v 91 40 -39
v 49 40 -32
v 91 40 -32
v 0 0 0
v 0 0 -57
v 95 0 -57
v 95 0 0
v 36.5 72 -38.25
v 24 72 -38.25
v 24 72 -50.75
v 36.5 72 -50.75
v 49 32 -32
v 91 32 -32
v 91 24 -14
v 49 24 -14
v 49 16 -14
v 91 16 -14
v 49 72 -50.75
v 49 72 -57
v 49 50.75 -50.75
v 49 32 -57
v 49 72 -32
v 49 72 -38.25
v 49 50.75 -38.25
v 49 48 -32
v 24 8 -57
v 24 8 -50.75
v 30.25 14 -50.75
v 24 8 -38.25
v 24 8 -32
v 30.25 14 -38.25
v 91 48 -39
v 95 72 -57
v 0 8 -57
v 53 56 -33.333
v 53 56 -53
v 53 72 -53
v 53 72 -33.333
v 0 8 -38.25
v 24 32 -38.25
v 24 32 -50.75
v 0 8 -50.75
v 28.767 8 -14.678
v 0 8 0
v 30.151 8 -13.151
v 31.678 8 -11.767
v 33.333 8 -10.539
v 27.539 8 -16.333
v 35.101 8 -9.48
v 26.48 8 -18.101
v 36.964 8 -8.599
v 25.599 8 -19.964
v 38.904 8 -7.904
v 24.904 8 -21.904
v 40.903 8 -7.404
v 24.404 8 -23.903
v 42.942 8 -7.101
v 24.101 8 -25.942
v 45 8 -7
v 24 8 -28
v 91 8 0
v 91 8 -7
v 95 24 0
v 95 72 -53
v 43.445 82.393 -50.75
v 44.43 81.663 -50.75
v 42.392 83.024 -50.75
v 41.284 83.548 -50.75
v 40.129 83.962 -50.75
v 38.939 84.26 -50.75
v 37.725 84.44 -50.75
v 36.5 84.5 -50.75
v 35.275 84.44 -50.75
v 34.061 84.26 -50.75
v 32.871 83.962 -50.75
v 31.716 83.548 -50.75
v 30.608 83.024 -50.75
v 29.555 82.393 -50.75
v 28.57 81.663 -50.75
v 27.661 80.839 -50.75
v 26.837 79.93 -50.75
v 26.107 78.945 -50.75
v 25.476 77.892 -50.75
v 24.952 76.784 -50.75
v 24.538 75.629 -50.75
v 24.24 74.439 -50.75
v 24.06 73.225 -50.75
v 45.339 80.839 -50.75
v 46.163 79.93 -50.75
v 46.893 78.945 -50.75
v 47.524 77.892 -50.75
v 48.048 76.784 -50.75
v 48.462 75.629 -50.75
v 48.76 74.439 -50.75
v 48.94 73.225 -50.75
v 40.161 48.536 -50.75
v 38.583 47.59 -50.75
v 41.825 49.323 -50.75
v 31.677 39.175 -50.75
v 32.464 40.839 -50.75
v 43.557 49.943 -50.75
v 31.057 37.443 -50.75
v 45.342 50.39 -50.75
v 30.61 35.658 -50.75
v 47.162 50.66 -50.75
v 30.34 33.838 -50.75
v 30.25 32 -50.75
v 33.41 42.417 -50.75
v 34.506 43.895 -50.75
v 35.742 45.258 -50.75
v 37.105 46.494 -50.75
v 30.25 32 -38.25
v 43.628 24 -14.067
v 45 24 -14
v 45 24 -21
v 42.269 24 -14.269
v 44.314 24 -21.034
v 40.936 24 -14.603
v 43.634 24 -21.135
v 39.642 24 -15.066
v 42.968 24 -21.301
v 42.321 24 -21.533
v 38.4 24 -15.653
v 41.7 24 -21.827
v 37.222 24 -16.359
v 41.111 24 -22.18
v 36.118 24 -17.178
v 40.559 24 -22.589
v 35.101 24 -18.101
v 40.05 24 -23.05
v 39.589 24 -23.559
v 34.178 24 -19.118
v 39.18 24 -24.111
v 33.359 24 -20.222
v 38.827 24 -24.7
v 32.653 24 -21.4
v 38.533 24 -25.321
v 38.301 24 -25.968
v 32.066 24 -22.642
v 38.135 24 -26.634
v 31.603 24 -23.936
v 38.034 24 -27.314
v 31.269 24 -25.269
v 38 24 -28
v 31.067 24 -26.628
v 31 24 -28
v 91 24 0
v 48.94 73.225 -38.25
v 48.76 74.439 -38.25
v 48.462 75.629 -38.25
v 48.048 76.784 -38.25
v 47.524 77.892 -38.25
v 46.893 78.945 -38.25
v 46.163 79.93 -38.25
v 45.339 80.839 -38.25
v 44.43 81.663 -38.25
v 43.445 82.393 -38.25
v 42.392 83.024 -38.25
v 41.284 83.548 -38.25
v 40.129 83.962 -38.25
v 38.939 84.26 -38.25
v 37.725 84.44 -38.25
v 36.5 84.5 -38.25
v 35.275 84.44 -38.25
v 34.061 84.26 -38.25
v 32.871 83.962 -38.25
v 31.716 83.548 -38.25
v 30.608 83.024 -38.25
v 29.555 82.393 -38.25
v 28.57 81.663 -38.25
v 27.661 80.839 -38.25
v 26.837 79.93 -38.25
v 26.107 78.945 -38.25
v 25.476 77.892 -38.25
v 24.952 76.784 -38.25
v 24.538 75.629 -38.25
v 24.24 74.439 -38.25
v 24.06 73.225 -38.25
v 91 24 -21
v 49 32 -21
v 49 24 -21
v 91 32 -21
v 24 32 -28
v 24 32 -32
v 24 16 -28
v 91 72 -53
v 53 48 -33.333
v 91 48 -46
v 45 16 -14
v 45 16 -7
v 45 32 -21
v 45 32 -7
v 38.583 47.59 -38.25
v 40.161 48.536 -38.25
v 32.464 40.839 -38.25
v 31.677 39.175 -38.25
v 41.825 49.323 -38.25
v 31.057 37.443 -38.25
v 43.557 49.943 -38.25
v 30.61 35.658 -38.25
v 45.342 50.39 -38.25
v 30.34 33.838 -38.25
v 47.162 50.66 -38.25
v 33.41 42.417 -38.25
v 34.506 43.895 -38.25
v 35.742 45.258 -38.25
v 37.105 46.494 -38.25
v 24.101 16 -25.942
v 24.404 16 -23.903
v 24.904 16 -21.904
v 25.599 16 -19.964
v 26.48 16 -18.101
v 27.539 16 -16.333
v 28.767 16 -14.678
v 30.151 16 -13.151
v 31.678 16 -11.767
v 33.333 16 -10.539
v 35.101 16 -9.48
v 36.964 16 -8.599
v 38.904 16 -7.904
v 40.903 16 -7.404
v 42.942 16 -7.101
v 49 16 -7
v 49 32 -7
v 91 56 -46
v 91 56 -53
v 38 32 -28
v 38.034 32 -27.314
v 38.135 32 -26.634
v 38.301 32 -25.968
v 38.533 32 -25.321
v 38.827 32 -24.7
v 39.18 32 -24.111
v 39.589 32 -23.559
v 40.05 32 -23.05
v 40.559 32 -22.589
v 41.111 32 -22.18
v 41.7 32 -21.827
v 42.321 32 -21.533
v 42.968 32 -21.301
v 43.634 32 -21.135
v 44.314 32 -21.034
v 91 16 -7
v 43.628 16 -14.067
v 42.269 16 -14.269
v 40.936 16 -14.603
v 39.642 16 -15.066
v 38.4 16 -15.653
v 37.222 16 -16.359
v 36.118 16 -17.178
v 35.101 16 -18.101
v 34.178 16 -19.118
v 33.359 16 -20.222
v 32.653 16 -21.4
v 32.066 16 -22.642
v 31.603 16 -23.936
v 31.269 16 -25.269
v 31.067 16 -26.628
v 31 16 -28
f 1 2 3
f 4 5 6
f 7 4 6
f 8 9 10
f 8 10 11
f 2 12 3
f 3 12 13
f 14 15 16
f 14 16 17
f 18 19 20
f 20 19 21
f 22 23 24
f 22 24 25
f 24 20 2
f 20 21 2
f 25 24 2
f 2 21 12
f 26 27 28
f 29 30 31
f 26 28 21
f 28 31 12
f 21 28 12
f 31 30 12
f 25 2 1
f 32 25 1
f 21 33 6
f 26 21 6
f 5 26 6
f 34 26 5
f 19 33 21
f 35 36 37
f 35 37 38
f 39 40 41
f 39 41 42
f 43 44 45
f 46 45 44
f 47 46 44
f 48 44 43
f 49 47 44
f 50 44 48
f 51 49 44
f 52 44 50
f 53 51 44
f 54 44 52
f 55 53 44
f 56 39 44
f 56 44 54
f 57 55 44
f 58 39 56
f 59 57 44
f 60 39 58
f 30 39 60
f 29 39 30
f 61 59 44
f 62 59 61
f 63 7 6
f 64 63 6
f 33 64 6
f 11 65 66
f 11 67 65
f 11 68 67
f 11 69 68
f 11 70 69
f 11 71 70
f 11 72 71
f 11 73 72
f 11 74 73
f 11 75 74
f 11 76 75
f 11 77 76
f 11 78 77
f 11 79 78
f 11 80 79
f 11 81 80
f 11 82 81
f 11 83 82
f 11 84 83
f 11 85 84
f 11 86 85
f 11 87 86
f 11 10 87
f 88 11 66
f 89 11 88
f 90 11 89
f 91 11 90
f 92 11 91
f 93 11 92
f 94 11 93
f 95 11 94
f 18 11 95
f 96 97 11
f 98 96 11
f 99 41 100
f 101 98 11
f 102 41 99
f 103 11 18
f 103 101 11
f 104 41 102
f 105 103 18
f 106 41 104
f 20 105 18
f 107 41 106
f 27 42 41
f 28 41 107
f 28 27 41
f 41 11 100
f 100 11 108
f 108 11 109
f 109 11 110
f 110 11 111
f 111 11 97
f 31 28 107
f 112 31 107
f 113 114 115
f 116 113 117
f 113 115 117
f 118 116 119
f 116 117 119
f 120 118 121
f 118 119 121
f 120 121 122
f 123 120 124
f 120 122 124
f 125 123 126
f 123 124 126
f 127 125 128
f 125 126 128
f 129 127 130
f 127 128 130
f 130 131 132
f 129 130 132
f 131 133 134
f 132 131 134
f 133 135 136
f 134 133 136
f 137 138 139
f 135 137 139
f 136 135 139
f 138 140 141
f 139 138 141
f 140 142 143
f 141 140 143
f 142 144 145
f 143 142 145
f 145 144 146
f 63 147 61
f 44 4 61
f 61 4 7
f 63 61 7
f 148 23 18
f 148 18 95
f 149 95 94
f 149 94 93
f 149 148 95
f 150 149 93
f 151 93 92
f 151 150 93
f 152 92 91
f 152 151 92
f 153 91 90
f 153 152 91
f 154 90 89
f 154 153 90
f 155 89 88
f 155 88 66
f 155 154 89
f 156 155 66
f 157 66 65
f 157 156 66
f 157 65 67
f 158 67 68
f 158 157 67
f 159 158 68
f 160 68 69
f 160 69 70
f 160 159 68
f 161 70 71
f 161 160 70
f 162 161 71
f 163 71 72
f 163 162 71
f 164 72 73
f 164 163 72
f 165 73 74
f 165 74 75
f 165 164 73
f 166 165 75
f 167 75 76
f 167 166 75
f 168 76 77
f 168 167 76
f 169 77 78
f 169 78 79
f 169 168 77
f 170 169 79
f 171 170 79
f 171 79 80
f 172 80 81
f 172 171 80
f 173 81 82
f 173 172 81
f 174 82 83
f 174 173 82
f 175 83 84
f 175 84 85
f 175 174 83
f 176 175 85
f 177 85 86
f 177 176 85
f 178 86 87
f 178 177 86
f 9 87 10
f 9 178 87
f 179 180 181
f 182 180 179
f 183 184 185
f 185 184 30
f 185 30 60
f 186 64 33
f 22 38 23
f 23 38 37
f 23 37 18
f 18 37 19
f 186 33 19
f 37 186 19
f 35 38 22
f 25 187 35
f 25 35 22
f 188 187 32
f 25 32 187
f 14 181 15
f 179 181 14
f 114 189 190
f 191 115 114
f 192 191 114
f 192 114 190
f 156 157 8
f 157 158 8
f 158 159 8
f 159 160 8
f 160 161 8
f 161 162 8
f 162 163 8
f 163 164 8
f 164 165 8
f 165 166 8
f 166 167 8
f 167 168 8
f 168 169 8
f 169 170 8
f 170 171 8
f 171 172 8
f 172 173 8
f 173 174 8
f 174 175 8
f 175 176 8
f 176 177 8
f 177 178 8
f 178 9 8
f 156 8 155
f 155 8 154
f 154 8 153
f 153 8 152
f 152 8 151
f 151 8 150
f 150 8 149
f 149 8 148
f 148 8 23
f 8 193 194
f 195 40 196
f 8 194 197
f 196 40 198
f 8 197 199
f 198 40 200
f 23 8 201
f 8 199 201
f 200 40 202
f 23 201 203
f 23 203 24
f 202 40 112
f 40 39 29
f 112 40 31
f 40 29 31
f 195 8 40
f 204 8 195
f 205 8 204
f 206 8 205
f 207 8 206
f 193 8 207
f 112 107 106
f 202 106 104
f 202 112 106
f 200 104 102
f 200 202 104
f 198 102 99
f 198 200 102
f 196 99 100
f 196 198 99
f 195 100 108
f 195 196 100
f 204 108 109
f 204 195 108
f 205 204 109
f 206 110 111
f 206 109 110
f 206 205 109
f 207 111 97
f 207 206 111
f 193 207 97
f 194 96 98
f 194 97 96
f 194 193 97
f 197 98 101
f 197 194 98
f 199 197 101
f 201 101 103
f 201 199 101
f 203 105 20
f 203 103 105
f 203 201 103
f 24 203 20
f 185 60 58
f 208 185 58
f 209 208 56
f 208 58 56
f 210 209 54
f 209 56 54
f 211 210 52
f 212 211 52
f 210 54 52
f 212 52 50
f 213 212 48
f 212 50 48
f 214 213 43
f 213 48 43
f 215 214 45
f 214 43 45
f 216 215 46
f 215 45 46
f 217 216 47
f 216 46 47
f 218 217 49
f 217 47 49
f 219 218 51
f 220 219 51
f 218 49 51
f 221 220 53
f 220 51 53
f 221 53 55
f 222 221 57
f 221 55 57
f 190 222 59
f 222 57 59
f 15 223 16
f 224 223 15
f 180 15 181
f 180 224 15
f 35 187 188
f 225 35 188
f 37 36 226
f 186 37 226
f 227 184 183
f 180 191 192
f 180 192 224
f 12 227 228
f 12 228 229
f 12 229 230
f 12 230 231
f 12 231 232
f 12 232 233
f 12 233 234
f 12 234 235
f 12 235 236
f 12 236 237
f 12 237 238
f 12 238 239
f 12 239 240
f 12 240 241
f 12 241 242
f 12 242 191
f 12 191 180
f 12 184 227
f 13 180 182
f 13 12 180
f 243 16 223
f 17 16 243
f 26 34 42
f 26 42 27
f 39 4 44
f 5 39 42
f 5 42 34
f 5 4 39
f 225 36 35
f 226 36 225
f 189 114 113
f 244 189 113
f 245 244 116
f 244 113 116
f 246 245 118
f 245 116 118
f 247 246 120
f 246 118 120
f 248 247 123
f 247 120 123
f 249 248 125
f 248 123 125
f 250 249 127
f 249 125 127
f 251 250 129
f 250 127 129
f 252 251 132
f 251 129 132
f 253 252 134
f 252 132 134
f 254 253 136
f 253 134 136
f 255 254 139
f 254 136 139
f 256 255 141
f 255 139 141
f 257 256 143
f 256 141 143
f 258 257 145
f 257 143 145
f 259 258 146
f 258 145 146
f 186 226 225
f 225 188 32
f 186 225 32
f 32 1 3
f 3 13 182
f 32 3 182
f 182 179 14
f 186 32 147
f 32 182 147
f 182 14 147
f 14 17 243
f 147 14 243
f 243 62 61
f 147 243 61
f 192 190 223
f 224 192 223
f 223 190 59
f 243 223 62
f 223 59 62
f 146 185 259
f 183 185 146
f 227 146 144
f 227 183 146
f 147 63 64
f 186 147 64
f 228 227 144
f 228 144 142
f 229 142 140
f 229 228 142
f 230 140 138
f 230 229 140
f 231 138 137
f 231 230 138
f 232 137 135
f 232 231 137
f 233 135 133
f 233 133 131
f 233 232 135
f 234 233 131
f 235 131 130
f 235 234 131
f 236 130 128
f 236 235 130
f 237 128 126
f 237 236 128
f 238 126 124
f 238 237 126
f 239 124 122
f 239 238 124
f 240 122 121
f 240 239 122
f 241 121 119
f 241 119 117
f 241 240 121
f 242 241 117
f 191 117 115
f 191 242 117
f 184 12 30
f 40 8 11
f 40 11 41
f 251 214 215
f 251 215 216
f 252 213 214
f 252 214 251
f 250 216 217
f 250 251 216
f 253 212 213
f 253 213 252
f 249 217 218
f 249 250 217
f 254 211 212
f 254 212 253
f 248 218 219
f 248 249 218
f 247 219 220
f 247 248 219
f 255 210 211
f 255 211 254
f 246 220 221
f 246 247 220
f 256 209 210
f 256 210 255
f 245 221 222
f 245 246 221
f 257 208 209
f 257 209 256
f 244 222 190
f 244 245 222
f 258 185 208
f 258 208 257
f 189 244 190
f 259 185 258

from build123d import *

# Parameters (mm, degrees)
CROQUIS1_W               = 95
CROQUIS1_H               = 57
SALIENTE_EXTRUIR1_DEPTH  = 8
SALIENTE_EXTRUIR2_DEPTH  = 64
SALIENTE_EXTRUIR3_DEPTH  = 24
CROQUIS4_W               = 42
CROQUIS4_H               = 14
CORTAR_EXTRUIR1_DEPTH    = 8
CROQUIS5_W               = 42
CROQUIS5_H               = 7
CORTAR_EXTRUIR2_DEPTH    = 16
CORTAR_EXTRUIR3_DEPTH    = 16
SALIENTE_EXTRUIR6_DEPTH  = 8
SALIENTE_EXTRUIR8_DEPTH  = 16
SALIENTE_EXTRUIR9_DEPTH  = 40
SALIENTE_EXTRUIR10_DEPTH = 24
SALIENTE_EXTRUIR12_DEPTH = 25
CROQUIS13_W              = 49
CROQUIS13_H              = 12.5
SALIENTE_EXTRUIR13_DEPTH = 77.5
CORTAR_EXTRUIR4_DEPTH    = 19.75
CORTAR_EXTRUIR5_REACH    = 52.75


with BuildPart() as part:
    # Croquis1 → Saliente-Extruir1 (new body)
    with BuildSketch(Plane(origin=(0, 0, 0), x_dir=(1, 0, 0), z_dir=(0, 1, 0))):
        with Locations((47.5, 28.5)):
            Rectangle(CROQUIS1_W, CROQUIS1_H)
    extrude(amount=SALIENTE_EXTRUIR1_DEPTH)

    # Croquis2 → Saliente-Extruir2 (add)
    with BuildSketch(Plane(origin=(0, 8, 0), x_dir=(1, 0, 0), z_dir=(0, 1, 0))):
        Polygon((95, 0), (95, 7), (95, 53), (95, 57), (49, 57), (49, 32), (53, 33.826086957), (53, 53), (91, 53), (91, 7), (91, 0), align=None)
    extrude(amount=SALIENTE_EXTRUIR2_DEPTH)

    # Croquis3 → Saliente-Extruir3 (add)
    with BuildSketch(Plane(origin=(0, 8, 0), x_dir=(1, 0, 0), z_dir=(0, 1, 0))):
        with BuildLine():
            Line((45, 7), (91, 7))
            Line((91, 7), (91, 53))
            Line((91, 53), (53, 53))
            Line((53, 53), (53, 33.826086957))
            Line((53, 33.826086957), (49, 32))
            Line((49, 32), (24, 32))
            Line((24, 32), (24, 28))
            ThreePointArc((24, 28), (30.150757595, 13.150757595), (45, 7))
        make_face()
    extrude(amount=SALIENTE_EXTRUIR3_DEPTH)

    # Croquis4 → Cortar-Extruir1 (cut)
    with BuildSketch(Plane(origin=(0, 32, 0), x_dir=(1, 0, 0), z_dir=(0, 1, 0))):
        with BuildLine():
            ThreePointArc((38, 28), (40.050252532, 23.050252532), (45, 21))
            Line((45, 21), (45, 7))
            ThreePointArc((45, 7), (30.150757595, 13.150757595), (24, 28))
            Line((24, 28), (38, 28))
        make_face()
        with Locations((70, 14)):
            Rectangle(CROQUIS4_W, CROQUIS4_H)
    extrude(amount=-CORTAR_EXTRUIR1_DEPTH, mode=Mode.SUBTRACT)

    # Croquis5 → Cortar-Extruir2 (cut)
    with BuildSketch(Plane(origin=(0, 32, 0), x_dir=(1, 0, 0), z_dir=(0, 1, 0))):
        with BuildLine():
            ThreePointArc((45, 14), (35.100505063, 18.100505063), (31, 28))
            Line((31, 28), (24, 28))
            ThreePointArc((24, 28), (30.150757595, 13.150757595), (45, 7))
            Line((45, 7), (45, 14))
        make_face()
        with Locations((70, 10.5)):
            Rectangle(CROQUIS5_W, CROQUIS5_H)
    extrude(amount=-CORTAR_EXTRUIR2_DEPTH, mode=Mode.SUBTRACT)

    # Croquis6 → Cortar-Extruir3 (cut)
    with BuildSketch(Plane(origin=(95, 0, 0), x_dir=(0, 0, -1), z_dir=(1, 0, 0))):
        Polygon((0, 72), (0, 24), (53, 72), align=None)
    extrude(amount=-CORTAR_EXTRUIR3_DEPTH, mode=Mode.SUBTRACT)



with BuildPart() as body_2:
    # Croquis7 → Saliente-Extruir6 (new body)
    with BuildSketch(Plane(origin=(0, 32, 0), x_dir=(1, 0, 0), z_dir=(0, 1, 0))):
        Polygon((49, 32), (91, 32), (91, 39), align=None)
    extrude(amount=SALIENTE_EXTRUIR6_DEPTH)


with BuildPart() as body_3:
    # Croquis9 → Saliente-Extruir8 (new body)
    with BuildSketch(Plane(origin=(0, 32, 0), x_dir=(1, 0, 0), z_dir=(0, 1, 0))):
        Polygon((91, 39), (91, 46), (49, 32), align=None)
    extrude(amount=SALIENTE_EXTRUIR8_DEPTH)


with BuildPart() as part_1:
    add(part.part)

    add(body_2.part)  # Saliente-Extruir9 merges body 2

    add(body_3.part)  # Saliente-Extruir9 merges body 3
    # Croquis10 → Saliente-Extruir9 (add)
    with BuildSketch(Plane(origin=(0, 32, 0), x_dir=(1, 0, 0), z_dir=(0, 1, 0))):
        Polygon((49, 32), (53, 33.826086957), (53, 33.333333333), align=None)
    extrude(amount=SALIENTE_EXTRUIR9_DEPTH)

    # Croquis11 → Saliente-Extruir10 (add)
    with BuildSketch(Plane(origin=(0, 32, 0), x_dir=(1, 0, 0), z_dir=(0, 1, 0))):
        Polygon((53, 53), (53, 33.333333333), (91, 46), (91, 53), align=None)
    extrude(amount=SALIENTE_EXTRUIR10_DEPTH)

    # Croquis12 → Saliente-Extruir12 (add)
    with BuildSketch(Plane(origin=(0, 0, -32), x_dir=(-1, 0, 0), z_dir=(0, 0, -1))):
        Polygon((-49, 32), (-49, 8), (-24, 8), align=None)
    extrude(amount=SALIENTE_EXTRUIR12_DEPTH)

    # Croquis13 → Saliente-Extruir13 (add)
    with BuildSketch(Plane(origin=(0, 8, 0), x_dir=(1, 0, 0), z_dir=(0, 1, 0))):
        with Locations((24.5, 44.5)):
            Rectangle(CROQUIS13_W, CROQUIS13_H)
    extrude(amount=SALIENTE_EXTRUIR13_DEPTH)

    # Croquis14 → Cortar-Extruir4 (cut, through all)
    with BuildSketch(Plane.XY.offset(-38.25)):
        with BuildLine():
            Line((24, 32), (0, 8))
            Line((0, 8), (0, 85.5))
            Line((0, 85.5), (49, 85.5))
            Line((49, 85.5), (49, 72))
            ThreePointArc((49, 72), (36.5, 84.5), (24, 72))
            Line((24, 72), (36.5, 72))
            Line((36.5, 72), (24, 32))
        make_face()
        with BuildLine():
            Line((49, 50.75), (49, 32))
            Line((49, 32), (30.25, 32))
            ThreePointArc((30.25, 32), (35.741747853, 45.258252147), (49, 50.75))
        make_face()
    extrude(amount=-CORTAR_EXTRUIR4_DEPTH, mode=Mode.SUBTRACT)

    # Croquis15 → Cortar-Extruir5 (cut, up to next)
    with BuildSketch(Plane(origin=(0, 0, -50.75), x_dir=(-1, 0, 0), z_dir=(0, 0, -1)), mode=Mode.PRIVATE) as cortar_extruir5_sk1:
        Polygon((-30.25, 32), (-49, 32), (-30.25, 14), align=None)
    cortar_extruir5_tool1 = extrude(cortar_extruir5_sk1.sketch, amount=-CORTAR_EXTRUIR5_REACH, mode=Mode.PRIVATE) & part_1.part
    add(cortar_extruir5_tool1.solids().sort_by_distance((36.5, 26, -50.75))[0], mode=Mode.SUBTRACT)


solid = part_1.part
